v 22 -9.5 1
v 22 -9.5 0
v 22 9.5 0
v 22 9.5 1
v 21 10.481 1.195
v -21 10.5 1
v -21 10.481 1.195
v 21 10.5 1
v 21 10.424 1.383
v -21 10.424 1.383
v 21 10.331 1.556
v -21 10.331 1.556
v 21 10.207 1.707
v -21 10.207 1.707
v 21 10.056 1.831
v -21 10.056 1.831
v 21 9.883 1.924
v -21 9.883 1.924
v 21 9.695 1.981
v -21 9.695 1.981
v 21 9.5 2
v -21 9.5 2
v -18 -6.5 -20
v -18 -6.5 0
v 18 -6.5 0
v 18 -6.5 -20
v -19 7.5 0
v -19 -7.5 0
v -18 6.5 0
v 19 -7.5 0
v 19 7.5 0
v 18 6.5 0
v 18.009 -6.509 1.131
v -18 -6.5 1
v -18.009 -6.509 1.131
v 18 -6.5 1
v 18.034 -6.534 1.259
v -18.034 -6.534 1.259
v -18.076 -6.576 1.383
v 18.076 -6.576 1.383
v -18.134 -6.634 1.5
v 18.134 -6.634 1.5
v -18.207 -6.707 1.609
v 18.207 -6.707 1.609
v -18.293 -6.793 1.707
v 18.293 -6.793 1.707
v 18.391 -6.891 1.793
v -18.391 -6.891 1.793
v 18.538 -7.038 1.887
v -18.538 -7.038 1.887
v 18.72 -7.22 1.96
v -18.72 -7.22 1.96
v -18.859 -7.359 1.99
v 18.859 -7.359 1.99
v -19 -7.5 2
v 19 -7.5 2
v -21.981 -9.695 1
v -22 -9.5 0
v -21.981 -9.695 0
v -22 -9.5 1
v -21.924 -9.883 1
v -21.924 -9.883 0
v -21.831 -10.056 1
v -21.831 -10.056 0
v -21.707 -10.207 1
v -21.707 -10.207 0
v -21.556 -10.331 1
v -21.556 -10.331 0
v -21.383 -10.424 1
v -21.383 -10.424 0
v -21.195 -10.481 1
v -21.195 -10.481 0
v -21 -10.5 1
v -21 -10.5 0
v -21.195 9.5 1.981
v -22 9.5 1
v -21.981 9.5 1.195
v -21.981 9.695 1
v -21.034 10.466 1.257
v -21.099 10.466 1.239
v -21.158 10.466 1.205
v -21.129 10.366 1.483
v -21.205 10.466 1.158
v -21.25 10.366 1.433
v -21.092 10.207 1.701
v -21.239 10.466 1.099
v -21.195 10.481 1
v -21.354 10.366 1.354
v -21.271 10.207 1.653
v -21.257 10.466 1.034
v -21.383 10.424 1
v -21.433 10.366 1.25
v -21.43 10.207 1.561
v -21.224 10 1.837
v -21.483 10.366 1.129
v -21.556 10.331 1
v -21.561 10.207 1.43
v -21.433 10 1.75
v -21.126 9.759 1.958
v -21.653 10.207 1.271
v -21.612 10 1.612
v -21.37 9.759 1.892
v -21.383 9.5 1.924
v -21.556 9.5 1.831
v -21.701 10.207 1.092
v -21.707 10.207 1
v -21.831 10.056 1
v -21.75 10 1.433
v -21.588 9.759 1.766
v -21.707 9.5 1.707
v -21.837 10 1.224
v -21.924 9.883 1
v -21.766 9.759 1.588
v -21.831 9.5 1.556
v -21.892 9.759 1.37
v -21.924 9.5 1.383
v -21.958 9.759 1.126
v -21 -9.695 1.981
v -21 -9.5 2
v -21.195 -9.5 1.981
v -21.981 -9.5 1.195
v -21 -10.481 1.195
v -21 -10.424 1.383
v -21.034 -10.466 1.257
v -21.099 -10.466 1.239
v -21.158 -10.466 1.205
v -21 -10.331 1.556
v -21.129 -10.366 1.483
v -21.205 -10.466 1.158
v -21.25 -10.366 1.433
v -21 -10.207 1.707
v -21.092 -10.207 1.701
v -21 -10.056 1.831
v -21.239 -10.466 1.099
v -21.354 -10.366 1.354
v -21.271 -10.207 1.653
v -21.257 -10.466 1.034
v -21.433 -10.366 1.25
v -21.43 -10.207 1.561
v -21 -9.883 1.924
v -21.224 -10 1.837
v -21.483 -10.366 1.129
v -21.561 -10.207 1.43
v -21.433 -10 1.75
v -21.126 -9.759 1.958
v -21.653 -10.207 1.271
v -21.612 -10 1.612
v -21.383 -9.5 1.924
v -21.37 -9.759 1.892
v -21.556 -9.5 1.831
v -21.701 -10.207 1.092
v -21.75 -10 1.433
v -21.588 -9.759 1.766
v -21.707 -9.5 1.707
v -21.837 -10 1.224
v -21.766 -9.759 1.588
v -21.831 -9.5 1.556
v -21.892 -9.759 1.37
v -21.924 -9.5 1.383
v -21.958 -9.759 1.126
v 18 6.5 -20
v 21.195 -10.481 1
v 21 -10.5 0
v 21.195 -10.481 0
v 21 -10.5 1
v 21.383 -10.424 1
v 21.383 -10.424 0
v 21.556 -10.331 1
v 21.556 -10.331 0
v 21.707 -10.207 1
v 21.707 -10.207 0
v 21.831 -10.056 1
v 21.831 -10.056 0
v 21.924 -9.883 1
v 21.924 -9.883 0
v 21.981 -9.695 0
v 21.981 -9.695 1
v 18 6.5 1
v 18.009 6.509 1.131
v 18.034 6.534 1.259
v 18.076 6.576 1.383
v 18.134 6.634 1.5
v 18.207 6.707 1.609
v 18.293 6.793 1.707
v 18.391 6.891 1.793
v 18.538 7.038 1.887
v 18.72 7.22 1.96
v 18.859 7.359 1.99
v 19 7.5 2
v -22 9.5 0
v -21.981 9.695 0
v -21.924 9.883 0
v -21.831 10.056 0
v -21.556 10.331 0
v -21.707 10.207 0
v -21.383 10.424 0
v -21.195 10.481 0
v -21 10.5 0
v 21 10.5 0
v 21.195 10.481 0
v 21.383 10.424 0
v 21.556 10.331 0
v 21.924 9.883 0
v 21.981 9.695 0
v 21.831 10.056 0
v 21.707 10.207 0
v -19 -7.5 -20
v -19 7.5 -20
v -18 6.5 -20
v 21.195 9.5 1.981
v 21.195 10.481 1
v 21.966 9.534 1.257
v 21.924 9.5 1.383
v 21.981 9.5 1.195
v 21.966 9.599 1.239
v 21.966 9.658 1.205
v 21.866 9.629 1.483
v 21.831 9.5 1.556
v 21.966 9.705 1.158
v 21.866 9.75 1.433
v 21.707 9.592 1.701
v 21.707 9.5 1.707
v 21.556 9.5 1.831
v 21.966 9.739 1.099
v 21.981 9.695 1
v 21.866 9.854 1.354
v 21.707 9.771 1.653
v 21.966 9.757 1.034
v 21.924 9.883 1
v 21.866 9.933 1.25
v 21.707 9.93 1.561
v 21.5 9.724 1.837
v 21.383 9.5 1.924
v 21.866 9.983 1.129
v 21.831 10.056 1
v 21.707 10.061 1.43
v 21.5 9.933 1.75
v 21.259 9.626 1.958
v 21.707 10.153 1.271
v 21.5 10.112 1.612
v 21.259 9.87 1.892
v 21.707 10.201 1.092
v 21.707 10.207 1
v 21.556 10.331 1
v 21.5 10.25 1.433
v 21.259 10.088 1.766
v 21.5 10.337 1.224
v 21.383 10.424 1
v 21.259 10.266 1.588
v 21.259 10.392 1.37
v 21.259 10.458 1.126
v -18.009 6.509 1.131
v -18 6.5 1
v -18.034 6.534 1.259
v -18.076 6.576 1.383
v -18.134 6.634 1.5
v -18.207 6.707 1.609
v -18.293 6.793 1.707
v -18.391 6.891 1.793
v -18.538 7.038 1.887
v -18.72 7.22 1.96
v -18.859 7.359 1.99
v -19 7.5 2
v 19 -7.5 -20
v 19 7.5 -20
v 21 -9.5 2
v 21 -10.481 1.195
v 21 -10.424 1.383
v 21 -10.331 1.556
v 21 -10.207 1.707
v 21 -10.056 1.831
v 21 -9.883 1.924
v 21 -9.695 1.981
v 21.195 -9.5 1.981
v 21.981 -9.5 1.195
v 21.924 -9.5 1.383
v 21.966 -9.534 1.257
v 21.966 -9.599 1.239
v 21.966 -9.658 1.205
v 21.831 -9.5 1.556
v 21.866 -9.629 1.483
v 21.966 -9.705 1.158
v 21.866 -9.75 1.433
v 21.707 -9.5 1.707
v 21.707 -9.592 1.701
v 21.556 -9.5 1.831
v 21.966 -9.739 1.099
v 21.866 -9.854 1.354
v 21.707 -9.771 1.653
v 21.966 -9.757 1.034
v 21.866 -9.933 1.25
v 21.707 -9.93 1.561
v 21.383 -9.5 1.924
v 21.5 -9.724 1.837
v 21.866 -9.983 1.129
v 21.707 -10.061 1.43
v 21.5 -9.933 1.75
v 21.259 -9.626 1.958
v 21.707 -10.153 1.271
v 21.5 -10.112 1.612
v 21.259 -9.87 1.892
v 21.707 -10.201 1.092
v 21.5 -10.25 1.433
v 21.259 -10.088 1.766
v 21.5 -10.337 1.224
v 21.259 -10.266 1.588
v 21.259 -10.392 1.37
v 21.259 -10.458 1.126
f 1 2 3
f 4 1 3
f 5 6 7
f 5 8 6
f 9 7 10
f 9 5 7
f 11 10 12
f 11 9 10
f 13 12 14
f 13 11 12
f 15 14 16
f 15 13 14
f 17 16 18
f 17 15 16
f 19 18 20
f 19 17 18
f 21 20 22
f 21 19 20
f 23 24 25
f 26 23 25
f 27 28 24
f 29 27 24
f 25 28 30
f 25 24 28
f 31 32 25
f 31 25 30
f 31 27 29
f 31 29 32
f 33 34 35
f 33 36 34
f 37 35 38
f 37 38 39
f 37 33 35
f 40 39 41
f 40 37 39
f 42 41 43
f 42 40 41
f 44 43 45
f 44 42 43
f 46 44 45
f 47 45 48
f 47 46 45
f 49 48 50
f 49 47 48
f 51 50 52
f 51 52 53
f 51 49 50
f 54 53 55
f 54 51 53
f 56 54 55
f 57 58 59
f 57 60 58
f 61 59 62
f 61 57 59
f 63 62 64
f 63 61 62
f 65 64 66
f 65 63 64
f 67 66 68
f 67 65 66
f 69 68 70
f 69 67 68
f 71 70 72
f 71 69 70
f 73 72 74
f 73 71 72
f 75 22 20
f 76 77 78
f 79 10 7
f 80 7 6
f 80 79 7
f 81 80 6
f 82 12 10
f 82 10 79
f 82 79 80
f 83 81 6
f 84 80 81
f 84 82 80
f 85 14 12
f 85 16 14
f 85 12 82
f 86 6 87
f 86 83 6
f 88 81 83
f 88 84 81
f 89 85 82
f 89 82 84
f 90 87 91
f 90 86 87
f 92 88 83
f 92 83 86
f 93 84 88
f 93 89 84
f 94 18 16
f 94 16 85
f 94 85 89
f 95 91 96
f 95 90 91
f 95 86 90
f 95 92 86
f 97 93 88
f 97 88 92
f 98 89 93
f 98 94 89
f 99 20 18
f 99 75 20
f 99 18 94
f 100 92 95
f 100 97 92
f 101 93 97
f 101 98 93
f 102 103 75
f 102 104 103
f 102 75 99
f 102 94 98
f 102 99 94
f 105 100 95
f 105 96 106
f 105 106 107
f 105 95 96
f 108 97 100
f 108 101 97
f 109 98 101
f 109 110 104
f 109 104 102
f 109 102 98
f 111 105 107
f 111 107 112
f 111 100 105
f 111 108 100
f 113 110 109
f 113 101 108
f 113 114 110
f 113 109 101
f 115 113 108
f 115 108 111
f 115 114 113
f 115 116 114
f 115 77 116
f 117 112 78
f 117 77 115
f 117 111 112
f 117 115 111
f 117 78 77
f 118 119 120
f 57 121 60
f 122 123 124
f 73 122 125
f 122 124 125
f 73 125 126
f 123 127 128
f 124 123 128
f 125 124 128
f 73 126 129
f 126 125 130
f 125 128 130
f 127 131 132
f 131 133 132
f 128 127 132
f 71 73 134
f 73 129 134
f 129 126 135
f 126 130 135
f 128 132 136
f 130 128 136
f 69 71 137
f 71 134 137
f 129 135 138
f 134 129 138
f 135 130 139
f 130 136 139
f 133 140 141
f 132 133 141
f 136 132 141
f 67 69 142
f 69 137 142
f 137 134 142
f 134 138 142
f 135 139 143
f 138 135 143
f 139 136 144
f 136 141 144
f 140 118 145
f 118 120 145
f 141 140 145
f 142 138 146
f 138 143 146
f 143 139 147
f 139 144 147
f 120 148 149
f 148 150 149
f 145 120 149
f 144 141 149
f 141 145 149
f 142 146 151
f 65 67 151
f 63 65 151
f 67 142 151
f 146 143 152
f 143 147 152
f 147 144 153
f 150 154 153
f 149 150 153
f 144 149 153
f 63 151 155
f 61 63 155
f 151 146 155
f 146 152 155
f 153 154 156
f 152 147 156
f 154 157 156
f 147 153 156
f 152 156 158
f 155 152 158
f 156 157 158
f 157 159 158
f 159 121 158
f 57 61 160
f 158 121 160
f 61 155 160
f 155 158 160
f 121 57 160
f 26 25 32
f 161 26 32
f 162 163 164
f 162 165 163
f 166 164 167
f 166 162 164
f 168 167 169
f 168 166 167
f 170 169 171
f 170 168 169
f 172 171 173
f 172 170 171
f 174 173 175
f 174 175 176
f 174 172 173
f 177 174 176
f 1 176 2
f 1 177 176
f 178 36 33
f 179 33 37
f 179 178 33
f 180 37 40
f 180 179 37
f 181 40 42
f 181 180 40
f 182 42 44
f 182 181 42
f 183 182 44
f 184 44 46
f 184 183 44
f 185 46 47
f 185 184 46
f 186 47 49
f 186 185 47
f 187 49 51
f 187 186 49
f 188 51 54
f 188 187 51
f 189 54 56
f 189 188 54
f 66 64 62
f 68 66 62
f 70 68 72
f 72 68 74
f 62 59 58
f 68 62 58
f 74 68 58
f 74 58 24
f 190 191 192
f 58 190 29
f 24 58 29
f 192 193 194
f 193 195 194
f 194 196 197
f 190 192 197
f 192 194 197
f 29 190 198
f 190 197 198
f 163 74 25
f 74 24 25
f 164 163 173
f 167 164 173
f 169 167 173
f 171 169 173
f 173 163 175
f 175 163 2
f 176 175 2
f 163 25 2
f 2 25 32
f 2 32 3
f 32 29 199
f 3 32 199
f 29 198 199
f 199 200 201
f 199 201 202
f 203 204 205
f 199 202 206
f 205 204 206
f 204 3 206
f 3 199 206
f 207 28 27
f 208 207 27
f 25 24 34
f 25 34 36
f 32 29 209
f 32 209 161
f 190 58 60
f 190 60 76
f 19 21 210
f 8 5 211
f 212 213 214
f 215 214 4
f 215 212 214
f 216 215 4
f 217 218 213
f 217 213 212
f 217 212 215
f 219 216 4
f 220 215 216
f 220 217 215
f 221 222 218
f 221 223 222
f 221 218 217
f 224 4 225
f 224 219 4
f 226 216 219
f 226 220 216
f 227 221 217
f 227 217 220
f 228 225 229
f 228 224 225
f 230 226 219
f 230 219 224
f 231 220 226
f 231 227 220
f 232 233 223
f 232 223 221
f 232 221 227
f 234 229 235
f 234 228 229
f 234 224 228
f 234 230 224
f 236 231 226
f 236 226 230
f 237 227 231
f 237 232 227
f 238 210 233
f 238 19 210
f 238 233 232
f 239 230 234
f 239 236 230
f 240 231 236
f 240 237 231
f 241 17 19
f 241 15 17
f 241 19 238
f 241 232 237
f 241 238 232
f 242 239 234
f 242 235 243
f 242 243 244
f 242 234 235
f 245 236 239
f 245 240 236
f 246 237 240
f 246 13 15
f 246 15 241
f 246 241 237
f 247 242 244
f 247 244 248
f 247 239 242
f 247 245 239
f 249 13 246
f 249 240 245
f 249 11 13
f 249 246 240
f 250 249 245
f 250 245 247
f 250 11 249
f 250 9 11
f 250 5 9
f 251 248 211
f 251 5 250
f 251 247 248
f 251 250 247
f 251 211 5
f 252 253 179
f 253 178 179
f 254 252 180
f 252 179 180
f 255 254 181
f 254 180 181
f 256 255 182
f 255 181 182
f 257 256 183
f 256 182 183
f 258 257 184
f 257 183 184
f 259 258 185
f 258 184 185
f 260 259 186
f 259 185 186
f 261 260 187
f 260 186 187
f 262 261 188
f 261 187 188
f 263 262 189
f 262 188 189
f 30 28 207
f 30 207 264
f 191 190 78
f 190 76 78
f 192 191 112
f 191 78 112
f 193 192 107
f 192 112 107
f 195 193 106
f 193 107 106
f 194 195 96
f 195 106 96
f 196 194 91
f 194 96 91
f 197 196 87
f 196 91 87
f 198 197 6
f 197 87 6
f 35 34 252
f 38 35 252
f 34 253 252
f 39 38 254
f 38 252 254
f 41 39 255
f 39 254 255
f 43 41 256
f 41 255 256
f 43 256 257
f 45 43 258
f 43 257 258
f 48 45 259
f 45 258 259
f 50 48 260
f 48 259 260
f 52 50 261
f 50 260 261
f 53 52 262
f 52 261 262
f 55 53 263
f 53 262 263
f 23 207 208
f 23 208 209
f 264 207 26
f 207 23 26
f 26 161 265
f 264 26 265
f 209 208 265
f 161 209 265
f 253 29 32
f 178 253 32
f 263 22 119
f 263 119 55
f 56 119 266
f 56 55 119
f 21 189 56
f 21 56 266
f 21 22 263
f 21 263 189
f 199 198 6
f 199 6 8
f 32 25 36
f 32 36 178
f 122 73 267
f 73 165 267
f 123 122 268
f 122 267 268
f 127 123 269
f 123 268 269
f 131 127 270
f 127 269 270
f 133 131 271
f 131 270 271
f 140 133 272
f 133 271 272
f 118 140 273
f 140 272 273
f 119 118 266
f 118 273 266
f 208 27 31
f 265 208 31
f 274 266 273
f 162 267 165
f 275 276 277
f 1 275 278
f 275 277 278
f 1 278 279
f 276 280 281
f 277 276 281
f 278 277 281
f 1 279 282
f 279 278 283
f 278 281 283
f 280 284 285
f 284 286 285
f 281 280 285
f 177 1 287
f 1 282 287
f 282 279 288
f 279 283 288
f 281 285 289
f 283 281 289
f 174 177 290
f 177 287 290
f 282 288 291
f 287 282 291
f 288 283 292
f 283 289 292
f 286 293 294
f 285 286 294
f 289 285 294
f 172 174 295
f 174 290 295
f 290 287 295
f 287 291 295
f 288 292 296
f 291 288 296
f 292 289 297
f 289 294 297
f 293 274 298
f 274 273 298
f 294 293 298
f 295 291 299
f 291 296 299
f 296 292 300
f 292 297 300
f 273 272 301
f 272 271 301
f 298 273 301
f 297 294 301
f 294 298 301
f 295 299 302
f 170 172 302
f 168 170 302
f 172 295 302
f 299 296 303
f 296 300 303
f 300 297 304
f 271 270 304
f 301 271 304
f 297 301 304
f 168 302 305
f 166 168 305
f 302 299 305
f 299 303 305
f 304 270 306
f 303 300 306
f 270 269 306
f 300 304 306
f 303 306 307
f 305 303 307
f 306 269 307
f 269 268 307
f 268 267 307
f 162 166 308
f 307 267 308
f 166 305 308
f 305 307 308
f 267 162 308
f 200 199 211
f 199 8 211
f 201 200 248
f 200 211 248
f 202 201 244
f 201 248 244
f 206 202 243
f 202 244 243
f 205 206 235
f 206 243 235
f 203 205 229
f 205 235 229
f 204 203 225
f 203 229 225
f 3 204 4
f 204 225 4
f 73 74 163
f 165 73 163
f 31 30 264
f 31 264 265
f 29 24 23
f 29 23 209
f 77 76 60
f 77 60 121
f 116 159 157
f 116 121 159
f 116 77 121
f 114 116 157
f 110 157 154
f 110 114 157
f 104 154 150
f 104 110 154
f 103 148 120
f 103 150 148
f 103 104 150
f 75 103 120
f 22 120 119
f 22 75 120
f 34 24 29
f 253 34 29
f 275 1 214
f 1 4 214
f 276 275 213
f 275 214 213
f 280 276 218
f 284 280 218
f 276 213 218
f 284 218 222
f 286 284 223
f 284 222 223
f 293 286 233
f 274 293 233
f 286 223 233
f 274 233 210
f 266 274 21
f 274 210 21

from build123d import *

# Parameters (mm, degrees)
F0_W     = 38
F0_H     = 15
F0_W_2   = 36
F0_H_2   = 13
F1_DEPTH = 20
F0_W_3   = 44
F0_H_3   = 21
F2_DEPTH = 2
F3_R     = 1


with BuildPart() as f1:
    # F0 (on Top) → F1 (new body)
    with BuildSketch(Plane.XY):
        Rectangle(F0_W, F0_H)
        Rectangle(F0_W_2, F0_H_2, mode=Mode.SUBTRACT)
    extrude(amount=-F1_DEPTH)


with BuildPart() as f2:
    # F0 (on Top) → F2 (new body)
    with BuildSketch(Plane.XY):
        Rectangle(F0_W_3, F0_H_3)
        Rectangle(F0_W, F0_H, mode=Mode.SUBTRACT)
        Rectangle(F0_W, F0_H)
        Rectangle(F0_W_2, F0_H_2, mode=Mode.SUBTRACT)
    extrude(amount=F2_DEPTH)

    # F3
    f3_edges = [f2.edges().sort_by_distance(p)[0] for p in [
        (0, 6.5, 2),
        (-18, 0, 2),
        (0, -6.5, 2),
        (18, 0, 2),
        (-22, 0, 2),
        (0, 10.5, 2),
        (0, -10.5, 2),
        (22, 0, 2),
        (-22, -10.5, 1),
        (22, -10.5, 1),
        (22, 10.5, 1),
        (-22, 10.5, 1),
    ]]
    fillet(f3_edges, radius=F3_R)


solid = Compound([f1.part, f2.part])
